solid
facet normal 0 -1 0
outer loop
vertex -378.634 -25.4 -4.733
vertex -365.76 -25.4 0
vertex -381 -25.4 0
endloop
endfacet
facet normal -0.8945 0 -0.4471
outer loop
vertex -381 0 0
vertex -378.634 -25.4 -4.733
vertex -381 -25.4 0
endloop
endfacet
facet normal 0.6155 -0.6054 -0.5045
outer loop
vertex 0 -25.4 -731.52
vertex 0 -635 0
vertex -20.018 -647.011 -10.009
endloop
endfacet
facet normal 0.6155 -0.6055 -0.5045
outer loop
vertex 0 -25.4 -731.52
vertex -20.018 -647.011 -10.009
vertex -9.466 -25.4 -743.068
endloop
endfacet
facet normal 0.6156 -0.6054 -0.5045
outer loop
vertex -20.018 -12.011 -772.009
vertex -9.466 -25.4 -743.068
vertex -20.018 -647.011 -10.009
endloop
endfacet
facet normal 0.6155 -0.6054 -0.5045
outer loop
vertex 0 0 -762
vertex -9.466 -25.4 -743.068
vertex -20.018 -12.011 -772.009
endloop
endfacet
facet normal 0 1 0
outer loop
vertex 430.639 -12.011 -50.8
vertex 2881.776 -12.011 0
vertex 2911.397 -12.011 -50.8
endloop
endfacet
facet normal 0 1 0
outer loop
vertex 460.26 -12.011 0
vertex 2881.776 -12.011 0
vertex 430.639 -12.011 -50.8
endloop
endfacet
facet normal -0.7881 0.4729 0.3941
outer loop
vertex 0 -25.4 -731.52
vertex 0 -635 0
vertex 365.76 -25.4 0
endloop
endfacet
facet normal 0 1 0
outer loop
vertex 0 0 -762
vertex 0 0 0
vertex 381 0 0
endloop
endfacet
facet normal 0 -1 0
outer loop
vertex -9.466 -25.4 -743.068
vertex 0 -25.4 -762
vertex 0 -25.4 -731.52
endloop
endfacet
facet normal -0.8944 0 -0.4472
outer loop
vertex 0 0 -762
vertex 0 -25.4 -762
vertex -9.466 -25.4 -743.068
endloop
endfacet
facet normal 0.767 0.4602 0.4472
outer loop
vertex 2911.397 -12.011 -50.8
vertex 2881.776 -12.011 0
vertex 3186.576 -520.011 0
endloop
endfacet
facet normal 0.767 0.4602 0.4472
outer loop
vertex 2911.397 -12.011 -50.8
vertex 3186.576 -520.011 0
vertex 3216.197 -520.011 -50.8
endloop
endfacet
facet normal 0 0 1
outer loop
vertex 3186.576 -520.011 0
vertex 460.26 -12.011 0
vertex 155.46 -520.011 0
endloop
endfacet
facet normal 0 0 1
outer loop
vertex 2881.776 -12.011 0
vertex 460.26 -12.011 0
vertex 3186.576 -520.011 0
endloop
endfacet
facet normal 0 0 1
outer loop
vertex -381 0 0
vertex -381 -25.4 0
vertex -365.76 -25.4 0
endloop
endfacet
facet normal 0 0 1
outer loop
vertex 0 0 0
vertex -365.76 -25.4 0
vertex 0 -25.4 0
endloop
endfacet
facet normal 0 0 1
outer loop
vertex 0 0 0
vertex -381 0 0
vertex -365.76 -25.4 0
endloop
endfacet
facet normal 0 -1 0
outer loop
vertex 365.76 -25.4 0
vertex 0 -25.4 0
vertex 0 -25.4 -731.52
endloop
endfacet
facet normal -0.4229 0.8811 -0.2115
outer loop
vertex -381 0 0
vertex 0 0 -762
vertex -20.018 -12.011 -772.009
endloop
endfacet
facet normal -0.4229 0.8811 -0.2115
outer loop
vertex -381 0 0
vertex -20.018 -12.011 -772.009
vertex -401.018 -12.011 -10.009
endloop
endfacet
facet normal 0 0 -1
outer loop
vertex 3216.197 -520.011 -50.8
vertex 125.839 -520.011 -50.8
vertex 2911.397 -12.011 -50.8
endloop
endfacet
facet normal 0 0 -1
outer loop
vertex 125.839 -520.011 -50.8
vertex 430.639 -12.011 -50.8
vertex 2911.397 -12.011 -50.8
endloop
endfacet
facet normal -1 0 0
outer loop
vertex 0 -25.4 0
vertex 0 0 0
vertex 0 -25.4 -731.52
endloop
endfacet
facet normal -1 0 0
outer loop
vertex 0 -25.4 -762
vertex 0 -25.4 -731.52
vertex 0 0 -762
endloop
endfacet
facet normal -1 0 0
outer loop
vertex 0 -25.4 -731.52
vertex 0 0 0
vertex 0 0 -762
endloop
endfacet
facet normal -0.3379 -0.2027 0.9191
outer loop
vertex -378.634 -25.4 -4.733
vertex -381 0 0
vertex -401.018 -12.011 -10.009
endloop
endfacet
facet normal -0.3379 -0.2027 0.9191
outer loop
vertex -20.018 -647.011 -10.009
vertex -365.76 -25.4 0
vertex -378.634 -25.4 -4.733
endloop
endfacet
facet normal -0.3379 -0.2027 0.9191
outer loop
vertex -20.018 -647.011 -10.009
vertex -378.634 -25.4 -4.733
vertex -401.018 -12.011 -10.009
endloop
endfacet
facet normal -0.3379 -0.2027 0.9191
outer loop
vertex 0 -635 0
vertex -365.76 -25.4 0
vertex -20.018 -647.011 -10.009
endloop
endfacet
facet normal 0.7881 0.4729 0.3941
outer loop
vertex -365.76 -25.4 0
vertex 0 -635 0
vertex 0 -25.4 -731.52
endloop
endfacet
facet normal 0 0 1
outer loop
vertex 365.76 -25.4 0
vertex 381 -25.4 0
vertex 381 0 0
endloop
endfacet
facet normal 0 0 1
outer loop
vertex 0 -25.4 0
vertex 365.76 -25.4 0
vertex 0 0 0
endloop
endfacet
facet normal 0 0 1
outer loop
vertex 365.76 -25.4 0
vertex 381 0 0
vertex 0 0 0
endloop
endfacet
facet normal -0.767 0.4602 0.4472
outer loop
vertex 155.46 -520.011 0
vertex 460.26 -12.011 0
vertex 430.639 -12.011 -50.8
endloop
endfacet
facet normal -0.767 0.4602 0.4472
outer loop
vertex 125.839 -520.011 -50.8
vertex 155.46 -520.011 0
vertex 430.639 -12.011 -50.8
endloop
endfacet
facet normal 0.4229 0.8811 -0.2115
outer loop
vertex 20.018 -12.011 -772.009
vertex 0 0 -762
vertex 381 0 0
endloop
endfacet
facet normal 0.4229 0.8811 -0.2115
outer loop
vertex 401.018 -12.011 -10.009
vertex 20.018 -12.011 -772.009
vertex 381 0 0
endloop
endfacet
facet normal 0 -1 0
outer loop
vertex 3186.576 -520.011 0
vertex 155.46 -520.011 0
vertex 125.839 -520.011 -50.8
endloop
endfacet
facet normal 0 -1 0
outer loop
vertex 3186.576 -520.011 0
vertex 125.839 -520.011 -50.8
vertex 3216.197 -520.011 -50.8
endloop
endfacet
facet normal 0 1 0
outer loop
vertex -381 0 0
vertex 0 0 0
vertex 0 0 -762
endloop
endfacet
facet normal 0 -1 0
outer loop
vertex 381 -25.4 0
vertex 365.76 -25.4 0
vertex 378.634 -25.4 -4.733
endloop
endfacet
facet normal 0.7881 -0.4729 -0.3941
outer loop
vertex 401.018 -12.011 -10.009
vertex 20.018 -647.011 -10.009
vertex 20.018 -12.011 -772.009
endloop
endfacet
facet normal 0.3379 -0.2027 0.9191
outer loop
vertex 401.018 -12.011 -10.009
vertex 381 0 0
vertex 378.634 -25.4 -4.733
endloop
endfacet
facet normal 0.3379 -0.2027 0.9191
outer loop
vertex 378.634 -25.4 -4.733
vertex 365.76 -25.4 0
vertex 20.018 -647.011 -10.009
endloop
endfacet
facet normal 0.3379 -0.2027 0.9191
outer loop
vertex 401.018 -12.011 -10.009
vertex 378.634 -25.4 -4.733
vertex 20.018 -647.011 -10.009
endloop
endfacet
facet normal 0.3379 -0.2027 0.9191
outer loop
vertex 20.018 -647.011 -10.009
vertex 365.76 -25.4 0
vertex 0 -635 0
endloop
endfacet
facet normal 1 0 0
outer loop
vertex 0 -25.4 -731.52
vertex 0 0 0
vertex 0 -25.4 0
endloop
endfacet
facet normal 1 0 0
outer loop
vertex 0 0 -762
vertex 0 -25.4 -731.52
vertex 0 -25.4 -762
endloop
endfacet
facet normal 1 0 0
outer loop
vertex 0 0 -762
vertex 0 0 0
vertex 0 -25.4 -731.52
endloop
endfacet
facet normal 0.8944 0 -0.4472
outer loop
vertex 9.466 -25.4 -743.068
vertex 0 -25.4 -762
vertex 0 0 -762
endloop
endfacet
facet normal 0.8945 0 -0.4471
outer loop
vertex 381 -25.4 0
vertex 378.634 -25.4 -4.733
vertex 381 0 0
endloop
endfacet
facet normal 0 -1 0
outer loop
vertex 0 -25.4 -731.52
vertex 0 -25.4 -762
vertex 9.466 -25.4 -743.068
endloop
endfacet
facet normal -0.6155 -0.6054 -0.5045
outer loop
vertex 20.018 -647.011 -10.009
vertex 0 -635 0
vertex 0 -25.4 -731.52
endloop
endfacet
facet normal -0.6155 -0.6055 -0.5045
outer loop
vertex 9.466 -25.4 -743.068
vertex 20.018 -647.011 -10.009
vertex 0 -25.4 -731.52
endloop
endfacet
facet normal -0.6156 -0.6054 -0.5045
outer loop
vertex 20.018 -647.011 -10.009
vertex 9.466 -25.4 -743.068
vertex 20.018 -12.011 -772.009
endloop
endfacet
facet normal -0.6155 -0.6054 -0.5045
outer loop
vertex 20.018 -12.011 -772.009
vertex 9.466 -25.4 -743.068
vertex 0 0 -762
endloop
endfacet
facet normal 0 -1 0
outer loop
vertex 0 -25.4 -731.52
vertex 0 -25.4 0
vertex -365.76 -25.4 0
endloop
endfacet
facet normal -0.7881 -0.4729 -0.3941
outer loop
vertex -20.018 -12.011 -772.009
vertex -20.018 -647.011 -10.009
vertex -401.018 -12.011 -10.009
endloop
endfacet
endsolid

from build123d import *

# Parameters (mm, degrees)
F4_DEPTH     = 25.4
F5_DEPTH     = 25.4
F8_DEPTH     = 50.8
F9_T1_DEPTH  = 1118.6779391399
F10_T1_DEPTH = 1118.6779391399


# Not quite as in the source:
# - a fillet or chamfer that OpenCascade refuses, or shapes differently, is made with other operations: its cross-section is extruded or revolved along the edge and cut away or added


with BuildPart() as f4:
    # F3 (on 3pt) → F4 (new body)
    with BuildSketch(Plane(origin=(236.6459627329, -141.9875776398, -118.3229813665), x_dir=(0.4229444261, 0.8811342211, -0.2114722131), z_dir=(0.7881104062, -0.4728662437, -0.3940552031))):
        Polygon((161.141826348, -681.5535195419), (161.141826348, 170.3883798855), (-559.5202303749, 0), align=None)
    extrude(amount=F4_DEPTH)

    # F1 (on Front) → F5 (join)
    with BuildSketch(Plane.XZ):
        Polygon((381, 0), (0, 0), (0, -762), align=None)
    extrude(amount=F5_DEPTH)


with BuildPart() as f6_1:
    # F6: instance of F4
    add(f4.part.mirror(Plane.YZ))


with BuildPart() as f8:
    # F7 (on Top) → F8 (new body)
    with BuildSketch(Plane.XY):
        Polygon((2941.0180043185, -12.0108025911), (401.0180043185, -12.0108025911), (96.2180043185, -520.0108025911), (401.0180043185, -520.0108025911), (2941.0180043185, -520.0108025911), (3245.8180043185, -520.0108025911), align=None)
    extrude(amount=-F8_DEPTH)

    # F9: chamfer of 50.8 x 101.5999998984 on 1 edges, made by hand

    # F9_s2 → F9_t1 (cut)
    with BuildSketch(Plane(origin=(236.2304668654, 393.7174447757, 0), x_dir=(0, 0, 1), z_dir=(-0.5144957554, -0.8574929257, 0))):
        Polygon((0, -400.8496087388), (-101.5999998984, -350.0496087388), (0, -350.0496087388), align=None)
    extrude(amount=F9_T1_DEPTH, mode=Mode.SUBTRACT)

    # F10: chamfer of 50.8 x 101.5999998984 on 1 edges, made by hand

    # F10_s2 → F10_t1 (cut)
    with BuildSketch(Plane(origin=(1223.981175034, -2039.9686250567, 0), x_dir=(0, 0, 1), z_dir=(-0.5144957554, 0.8574929257, 0))):
        Polygon((0, 2464.9226261439), (-101.5999998984, 2515.7226261439), (0, 2515.7226261439), align=None)
    extrude(amount=F10_T1_DEPTH, mode=Mode.SUBTRACT)


solid = Compound([f4.part, f6_1.part, f8.part])
